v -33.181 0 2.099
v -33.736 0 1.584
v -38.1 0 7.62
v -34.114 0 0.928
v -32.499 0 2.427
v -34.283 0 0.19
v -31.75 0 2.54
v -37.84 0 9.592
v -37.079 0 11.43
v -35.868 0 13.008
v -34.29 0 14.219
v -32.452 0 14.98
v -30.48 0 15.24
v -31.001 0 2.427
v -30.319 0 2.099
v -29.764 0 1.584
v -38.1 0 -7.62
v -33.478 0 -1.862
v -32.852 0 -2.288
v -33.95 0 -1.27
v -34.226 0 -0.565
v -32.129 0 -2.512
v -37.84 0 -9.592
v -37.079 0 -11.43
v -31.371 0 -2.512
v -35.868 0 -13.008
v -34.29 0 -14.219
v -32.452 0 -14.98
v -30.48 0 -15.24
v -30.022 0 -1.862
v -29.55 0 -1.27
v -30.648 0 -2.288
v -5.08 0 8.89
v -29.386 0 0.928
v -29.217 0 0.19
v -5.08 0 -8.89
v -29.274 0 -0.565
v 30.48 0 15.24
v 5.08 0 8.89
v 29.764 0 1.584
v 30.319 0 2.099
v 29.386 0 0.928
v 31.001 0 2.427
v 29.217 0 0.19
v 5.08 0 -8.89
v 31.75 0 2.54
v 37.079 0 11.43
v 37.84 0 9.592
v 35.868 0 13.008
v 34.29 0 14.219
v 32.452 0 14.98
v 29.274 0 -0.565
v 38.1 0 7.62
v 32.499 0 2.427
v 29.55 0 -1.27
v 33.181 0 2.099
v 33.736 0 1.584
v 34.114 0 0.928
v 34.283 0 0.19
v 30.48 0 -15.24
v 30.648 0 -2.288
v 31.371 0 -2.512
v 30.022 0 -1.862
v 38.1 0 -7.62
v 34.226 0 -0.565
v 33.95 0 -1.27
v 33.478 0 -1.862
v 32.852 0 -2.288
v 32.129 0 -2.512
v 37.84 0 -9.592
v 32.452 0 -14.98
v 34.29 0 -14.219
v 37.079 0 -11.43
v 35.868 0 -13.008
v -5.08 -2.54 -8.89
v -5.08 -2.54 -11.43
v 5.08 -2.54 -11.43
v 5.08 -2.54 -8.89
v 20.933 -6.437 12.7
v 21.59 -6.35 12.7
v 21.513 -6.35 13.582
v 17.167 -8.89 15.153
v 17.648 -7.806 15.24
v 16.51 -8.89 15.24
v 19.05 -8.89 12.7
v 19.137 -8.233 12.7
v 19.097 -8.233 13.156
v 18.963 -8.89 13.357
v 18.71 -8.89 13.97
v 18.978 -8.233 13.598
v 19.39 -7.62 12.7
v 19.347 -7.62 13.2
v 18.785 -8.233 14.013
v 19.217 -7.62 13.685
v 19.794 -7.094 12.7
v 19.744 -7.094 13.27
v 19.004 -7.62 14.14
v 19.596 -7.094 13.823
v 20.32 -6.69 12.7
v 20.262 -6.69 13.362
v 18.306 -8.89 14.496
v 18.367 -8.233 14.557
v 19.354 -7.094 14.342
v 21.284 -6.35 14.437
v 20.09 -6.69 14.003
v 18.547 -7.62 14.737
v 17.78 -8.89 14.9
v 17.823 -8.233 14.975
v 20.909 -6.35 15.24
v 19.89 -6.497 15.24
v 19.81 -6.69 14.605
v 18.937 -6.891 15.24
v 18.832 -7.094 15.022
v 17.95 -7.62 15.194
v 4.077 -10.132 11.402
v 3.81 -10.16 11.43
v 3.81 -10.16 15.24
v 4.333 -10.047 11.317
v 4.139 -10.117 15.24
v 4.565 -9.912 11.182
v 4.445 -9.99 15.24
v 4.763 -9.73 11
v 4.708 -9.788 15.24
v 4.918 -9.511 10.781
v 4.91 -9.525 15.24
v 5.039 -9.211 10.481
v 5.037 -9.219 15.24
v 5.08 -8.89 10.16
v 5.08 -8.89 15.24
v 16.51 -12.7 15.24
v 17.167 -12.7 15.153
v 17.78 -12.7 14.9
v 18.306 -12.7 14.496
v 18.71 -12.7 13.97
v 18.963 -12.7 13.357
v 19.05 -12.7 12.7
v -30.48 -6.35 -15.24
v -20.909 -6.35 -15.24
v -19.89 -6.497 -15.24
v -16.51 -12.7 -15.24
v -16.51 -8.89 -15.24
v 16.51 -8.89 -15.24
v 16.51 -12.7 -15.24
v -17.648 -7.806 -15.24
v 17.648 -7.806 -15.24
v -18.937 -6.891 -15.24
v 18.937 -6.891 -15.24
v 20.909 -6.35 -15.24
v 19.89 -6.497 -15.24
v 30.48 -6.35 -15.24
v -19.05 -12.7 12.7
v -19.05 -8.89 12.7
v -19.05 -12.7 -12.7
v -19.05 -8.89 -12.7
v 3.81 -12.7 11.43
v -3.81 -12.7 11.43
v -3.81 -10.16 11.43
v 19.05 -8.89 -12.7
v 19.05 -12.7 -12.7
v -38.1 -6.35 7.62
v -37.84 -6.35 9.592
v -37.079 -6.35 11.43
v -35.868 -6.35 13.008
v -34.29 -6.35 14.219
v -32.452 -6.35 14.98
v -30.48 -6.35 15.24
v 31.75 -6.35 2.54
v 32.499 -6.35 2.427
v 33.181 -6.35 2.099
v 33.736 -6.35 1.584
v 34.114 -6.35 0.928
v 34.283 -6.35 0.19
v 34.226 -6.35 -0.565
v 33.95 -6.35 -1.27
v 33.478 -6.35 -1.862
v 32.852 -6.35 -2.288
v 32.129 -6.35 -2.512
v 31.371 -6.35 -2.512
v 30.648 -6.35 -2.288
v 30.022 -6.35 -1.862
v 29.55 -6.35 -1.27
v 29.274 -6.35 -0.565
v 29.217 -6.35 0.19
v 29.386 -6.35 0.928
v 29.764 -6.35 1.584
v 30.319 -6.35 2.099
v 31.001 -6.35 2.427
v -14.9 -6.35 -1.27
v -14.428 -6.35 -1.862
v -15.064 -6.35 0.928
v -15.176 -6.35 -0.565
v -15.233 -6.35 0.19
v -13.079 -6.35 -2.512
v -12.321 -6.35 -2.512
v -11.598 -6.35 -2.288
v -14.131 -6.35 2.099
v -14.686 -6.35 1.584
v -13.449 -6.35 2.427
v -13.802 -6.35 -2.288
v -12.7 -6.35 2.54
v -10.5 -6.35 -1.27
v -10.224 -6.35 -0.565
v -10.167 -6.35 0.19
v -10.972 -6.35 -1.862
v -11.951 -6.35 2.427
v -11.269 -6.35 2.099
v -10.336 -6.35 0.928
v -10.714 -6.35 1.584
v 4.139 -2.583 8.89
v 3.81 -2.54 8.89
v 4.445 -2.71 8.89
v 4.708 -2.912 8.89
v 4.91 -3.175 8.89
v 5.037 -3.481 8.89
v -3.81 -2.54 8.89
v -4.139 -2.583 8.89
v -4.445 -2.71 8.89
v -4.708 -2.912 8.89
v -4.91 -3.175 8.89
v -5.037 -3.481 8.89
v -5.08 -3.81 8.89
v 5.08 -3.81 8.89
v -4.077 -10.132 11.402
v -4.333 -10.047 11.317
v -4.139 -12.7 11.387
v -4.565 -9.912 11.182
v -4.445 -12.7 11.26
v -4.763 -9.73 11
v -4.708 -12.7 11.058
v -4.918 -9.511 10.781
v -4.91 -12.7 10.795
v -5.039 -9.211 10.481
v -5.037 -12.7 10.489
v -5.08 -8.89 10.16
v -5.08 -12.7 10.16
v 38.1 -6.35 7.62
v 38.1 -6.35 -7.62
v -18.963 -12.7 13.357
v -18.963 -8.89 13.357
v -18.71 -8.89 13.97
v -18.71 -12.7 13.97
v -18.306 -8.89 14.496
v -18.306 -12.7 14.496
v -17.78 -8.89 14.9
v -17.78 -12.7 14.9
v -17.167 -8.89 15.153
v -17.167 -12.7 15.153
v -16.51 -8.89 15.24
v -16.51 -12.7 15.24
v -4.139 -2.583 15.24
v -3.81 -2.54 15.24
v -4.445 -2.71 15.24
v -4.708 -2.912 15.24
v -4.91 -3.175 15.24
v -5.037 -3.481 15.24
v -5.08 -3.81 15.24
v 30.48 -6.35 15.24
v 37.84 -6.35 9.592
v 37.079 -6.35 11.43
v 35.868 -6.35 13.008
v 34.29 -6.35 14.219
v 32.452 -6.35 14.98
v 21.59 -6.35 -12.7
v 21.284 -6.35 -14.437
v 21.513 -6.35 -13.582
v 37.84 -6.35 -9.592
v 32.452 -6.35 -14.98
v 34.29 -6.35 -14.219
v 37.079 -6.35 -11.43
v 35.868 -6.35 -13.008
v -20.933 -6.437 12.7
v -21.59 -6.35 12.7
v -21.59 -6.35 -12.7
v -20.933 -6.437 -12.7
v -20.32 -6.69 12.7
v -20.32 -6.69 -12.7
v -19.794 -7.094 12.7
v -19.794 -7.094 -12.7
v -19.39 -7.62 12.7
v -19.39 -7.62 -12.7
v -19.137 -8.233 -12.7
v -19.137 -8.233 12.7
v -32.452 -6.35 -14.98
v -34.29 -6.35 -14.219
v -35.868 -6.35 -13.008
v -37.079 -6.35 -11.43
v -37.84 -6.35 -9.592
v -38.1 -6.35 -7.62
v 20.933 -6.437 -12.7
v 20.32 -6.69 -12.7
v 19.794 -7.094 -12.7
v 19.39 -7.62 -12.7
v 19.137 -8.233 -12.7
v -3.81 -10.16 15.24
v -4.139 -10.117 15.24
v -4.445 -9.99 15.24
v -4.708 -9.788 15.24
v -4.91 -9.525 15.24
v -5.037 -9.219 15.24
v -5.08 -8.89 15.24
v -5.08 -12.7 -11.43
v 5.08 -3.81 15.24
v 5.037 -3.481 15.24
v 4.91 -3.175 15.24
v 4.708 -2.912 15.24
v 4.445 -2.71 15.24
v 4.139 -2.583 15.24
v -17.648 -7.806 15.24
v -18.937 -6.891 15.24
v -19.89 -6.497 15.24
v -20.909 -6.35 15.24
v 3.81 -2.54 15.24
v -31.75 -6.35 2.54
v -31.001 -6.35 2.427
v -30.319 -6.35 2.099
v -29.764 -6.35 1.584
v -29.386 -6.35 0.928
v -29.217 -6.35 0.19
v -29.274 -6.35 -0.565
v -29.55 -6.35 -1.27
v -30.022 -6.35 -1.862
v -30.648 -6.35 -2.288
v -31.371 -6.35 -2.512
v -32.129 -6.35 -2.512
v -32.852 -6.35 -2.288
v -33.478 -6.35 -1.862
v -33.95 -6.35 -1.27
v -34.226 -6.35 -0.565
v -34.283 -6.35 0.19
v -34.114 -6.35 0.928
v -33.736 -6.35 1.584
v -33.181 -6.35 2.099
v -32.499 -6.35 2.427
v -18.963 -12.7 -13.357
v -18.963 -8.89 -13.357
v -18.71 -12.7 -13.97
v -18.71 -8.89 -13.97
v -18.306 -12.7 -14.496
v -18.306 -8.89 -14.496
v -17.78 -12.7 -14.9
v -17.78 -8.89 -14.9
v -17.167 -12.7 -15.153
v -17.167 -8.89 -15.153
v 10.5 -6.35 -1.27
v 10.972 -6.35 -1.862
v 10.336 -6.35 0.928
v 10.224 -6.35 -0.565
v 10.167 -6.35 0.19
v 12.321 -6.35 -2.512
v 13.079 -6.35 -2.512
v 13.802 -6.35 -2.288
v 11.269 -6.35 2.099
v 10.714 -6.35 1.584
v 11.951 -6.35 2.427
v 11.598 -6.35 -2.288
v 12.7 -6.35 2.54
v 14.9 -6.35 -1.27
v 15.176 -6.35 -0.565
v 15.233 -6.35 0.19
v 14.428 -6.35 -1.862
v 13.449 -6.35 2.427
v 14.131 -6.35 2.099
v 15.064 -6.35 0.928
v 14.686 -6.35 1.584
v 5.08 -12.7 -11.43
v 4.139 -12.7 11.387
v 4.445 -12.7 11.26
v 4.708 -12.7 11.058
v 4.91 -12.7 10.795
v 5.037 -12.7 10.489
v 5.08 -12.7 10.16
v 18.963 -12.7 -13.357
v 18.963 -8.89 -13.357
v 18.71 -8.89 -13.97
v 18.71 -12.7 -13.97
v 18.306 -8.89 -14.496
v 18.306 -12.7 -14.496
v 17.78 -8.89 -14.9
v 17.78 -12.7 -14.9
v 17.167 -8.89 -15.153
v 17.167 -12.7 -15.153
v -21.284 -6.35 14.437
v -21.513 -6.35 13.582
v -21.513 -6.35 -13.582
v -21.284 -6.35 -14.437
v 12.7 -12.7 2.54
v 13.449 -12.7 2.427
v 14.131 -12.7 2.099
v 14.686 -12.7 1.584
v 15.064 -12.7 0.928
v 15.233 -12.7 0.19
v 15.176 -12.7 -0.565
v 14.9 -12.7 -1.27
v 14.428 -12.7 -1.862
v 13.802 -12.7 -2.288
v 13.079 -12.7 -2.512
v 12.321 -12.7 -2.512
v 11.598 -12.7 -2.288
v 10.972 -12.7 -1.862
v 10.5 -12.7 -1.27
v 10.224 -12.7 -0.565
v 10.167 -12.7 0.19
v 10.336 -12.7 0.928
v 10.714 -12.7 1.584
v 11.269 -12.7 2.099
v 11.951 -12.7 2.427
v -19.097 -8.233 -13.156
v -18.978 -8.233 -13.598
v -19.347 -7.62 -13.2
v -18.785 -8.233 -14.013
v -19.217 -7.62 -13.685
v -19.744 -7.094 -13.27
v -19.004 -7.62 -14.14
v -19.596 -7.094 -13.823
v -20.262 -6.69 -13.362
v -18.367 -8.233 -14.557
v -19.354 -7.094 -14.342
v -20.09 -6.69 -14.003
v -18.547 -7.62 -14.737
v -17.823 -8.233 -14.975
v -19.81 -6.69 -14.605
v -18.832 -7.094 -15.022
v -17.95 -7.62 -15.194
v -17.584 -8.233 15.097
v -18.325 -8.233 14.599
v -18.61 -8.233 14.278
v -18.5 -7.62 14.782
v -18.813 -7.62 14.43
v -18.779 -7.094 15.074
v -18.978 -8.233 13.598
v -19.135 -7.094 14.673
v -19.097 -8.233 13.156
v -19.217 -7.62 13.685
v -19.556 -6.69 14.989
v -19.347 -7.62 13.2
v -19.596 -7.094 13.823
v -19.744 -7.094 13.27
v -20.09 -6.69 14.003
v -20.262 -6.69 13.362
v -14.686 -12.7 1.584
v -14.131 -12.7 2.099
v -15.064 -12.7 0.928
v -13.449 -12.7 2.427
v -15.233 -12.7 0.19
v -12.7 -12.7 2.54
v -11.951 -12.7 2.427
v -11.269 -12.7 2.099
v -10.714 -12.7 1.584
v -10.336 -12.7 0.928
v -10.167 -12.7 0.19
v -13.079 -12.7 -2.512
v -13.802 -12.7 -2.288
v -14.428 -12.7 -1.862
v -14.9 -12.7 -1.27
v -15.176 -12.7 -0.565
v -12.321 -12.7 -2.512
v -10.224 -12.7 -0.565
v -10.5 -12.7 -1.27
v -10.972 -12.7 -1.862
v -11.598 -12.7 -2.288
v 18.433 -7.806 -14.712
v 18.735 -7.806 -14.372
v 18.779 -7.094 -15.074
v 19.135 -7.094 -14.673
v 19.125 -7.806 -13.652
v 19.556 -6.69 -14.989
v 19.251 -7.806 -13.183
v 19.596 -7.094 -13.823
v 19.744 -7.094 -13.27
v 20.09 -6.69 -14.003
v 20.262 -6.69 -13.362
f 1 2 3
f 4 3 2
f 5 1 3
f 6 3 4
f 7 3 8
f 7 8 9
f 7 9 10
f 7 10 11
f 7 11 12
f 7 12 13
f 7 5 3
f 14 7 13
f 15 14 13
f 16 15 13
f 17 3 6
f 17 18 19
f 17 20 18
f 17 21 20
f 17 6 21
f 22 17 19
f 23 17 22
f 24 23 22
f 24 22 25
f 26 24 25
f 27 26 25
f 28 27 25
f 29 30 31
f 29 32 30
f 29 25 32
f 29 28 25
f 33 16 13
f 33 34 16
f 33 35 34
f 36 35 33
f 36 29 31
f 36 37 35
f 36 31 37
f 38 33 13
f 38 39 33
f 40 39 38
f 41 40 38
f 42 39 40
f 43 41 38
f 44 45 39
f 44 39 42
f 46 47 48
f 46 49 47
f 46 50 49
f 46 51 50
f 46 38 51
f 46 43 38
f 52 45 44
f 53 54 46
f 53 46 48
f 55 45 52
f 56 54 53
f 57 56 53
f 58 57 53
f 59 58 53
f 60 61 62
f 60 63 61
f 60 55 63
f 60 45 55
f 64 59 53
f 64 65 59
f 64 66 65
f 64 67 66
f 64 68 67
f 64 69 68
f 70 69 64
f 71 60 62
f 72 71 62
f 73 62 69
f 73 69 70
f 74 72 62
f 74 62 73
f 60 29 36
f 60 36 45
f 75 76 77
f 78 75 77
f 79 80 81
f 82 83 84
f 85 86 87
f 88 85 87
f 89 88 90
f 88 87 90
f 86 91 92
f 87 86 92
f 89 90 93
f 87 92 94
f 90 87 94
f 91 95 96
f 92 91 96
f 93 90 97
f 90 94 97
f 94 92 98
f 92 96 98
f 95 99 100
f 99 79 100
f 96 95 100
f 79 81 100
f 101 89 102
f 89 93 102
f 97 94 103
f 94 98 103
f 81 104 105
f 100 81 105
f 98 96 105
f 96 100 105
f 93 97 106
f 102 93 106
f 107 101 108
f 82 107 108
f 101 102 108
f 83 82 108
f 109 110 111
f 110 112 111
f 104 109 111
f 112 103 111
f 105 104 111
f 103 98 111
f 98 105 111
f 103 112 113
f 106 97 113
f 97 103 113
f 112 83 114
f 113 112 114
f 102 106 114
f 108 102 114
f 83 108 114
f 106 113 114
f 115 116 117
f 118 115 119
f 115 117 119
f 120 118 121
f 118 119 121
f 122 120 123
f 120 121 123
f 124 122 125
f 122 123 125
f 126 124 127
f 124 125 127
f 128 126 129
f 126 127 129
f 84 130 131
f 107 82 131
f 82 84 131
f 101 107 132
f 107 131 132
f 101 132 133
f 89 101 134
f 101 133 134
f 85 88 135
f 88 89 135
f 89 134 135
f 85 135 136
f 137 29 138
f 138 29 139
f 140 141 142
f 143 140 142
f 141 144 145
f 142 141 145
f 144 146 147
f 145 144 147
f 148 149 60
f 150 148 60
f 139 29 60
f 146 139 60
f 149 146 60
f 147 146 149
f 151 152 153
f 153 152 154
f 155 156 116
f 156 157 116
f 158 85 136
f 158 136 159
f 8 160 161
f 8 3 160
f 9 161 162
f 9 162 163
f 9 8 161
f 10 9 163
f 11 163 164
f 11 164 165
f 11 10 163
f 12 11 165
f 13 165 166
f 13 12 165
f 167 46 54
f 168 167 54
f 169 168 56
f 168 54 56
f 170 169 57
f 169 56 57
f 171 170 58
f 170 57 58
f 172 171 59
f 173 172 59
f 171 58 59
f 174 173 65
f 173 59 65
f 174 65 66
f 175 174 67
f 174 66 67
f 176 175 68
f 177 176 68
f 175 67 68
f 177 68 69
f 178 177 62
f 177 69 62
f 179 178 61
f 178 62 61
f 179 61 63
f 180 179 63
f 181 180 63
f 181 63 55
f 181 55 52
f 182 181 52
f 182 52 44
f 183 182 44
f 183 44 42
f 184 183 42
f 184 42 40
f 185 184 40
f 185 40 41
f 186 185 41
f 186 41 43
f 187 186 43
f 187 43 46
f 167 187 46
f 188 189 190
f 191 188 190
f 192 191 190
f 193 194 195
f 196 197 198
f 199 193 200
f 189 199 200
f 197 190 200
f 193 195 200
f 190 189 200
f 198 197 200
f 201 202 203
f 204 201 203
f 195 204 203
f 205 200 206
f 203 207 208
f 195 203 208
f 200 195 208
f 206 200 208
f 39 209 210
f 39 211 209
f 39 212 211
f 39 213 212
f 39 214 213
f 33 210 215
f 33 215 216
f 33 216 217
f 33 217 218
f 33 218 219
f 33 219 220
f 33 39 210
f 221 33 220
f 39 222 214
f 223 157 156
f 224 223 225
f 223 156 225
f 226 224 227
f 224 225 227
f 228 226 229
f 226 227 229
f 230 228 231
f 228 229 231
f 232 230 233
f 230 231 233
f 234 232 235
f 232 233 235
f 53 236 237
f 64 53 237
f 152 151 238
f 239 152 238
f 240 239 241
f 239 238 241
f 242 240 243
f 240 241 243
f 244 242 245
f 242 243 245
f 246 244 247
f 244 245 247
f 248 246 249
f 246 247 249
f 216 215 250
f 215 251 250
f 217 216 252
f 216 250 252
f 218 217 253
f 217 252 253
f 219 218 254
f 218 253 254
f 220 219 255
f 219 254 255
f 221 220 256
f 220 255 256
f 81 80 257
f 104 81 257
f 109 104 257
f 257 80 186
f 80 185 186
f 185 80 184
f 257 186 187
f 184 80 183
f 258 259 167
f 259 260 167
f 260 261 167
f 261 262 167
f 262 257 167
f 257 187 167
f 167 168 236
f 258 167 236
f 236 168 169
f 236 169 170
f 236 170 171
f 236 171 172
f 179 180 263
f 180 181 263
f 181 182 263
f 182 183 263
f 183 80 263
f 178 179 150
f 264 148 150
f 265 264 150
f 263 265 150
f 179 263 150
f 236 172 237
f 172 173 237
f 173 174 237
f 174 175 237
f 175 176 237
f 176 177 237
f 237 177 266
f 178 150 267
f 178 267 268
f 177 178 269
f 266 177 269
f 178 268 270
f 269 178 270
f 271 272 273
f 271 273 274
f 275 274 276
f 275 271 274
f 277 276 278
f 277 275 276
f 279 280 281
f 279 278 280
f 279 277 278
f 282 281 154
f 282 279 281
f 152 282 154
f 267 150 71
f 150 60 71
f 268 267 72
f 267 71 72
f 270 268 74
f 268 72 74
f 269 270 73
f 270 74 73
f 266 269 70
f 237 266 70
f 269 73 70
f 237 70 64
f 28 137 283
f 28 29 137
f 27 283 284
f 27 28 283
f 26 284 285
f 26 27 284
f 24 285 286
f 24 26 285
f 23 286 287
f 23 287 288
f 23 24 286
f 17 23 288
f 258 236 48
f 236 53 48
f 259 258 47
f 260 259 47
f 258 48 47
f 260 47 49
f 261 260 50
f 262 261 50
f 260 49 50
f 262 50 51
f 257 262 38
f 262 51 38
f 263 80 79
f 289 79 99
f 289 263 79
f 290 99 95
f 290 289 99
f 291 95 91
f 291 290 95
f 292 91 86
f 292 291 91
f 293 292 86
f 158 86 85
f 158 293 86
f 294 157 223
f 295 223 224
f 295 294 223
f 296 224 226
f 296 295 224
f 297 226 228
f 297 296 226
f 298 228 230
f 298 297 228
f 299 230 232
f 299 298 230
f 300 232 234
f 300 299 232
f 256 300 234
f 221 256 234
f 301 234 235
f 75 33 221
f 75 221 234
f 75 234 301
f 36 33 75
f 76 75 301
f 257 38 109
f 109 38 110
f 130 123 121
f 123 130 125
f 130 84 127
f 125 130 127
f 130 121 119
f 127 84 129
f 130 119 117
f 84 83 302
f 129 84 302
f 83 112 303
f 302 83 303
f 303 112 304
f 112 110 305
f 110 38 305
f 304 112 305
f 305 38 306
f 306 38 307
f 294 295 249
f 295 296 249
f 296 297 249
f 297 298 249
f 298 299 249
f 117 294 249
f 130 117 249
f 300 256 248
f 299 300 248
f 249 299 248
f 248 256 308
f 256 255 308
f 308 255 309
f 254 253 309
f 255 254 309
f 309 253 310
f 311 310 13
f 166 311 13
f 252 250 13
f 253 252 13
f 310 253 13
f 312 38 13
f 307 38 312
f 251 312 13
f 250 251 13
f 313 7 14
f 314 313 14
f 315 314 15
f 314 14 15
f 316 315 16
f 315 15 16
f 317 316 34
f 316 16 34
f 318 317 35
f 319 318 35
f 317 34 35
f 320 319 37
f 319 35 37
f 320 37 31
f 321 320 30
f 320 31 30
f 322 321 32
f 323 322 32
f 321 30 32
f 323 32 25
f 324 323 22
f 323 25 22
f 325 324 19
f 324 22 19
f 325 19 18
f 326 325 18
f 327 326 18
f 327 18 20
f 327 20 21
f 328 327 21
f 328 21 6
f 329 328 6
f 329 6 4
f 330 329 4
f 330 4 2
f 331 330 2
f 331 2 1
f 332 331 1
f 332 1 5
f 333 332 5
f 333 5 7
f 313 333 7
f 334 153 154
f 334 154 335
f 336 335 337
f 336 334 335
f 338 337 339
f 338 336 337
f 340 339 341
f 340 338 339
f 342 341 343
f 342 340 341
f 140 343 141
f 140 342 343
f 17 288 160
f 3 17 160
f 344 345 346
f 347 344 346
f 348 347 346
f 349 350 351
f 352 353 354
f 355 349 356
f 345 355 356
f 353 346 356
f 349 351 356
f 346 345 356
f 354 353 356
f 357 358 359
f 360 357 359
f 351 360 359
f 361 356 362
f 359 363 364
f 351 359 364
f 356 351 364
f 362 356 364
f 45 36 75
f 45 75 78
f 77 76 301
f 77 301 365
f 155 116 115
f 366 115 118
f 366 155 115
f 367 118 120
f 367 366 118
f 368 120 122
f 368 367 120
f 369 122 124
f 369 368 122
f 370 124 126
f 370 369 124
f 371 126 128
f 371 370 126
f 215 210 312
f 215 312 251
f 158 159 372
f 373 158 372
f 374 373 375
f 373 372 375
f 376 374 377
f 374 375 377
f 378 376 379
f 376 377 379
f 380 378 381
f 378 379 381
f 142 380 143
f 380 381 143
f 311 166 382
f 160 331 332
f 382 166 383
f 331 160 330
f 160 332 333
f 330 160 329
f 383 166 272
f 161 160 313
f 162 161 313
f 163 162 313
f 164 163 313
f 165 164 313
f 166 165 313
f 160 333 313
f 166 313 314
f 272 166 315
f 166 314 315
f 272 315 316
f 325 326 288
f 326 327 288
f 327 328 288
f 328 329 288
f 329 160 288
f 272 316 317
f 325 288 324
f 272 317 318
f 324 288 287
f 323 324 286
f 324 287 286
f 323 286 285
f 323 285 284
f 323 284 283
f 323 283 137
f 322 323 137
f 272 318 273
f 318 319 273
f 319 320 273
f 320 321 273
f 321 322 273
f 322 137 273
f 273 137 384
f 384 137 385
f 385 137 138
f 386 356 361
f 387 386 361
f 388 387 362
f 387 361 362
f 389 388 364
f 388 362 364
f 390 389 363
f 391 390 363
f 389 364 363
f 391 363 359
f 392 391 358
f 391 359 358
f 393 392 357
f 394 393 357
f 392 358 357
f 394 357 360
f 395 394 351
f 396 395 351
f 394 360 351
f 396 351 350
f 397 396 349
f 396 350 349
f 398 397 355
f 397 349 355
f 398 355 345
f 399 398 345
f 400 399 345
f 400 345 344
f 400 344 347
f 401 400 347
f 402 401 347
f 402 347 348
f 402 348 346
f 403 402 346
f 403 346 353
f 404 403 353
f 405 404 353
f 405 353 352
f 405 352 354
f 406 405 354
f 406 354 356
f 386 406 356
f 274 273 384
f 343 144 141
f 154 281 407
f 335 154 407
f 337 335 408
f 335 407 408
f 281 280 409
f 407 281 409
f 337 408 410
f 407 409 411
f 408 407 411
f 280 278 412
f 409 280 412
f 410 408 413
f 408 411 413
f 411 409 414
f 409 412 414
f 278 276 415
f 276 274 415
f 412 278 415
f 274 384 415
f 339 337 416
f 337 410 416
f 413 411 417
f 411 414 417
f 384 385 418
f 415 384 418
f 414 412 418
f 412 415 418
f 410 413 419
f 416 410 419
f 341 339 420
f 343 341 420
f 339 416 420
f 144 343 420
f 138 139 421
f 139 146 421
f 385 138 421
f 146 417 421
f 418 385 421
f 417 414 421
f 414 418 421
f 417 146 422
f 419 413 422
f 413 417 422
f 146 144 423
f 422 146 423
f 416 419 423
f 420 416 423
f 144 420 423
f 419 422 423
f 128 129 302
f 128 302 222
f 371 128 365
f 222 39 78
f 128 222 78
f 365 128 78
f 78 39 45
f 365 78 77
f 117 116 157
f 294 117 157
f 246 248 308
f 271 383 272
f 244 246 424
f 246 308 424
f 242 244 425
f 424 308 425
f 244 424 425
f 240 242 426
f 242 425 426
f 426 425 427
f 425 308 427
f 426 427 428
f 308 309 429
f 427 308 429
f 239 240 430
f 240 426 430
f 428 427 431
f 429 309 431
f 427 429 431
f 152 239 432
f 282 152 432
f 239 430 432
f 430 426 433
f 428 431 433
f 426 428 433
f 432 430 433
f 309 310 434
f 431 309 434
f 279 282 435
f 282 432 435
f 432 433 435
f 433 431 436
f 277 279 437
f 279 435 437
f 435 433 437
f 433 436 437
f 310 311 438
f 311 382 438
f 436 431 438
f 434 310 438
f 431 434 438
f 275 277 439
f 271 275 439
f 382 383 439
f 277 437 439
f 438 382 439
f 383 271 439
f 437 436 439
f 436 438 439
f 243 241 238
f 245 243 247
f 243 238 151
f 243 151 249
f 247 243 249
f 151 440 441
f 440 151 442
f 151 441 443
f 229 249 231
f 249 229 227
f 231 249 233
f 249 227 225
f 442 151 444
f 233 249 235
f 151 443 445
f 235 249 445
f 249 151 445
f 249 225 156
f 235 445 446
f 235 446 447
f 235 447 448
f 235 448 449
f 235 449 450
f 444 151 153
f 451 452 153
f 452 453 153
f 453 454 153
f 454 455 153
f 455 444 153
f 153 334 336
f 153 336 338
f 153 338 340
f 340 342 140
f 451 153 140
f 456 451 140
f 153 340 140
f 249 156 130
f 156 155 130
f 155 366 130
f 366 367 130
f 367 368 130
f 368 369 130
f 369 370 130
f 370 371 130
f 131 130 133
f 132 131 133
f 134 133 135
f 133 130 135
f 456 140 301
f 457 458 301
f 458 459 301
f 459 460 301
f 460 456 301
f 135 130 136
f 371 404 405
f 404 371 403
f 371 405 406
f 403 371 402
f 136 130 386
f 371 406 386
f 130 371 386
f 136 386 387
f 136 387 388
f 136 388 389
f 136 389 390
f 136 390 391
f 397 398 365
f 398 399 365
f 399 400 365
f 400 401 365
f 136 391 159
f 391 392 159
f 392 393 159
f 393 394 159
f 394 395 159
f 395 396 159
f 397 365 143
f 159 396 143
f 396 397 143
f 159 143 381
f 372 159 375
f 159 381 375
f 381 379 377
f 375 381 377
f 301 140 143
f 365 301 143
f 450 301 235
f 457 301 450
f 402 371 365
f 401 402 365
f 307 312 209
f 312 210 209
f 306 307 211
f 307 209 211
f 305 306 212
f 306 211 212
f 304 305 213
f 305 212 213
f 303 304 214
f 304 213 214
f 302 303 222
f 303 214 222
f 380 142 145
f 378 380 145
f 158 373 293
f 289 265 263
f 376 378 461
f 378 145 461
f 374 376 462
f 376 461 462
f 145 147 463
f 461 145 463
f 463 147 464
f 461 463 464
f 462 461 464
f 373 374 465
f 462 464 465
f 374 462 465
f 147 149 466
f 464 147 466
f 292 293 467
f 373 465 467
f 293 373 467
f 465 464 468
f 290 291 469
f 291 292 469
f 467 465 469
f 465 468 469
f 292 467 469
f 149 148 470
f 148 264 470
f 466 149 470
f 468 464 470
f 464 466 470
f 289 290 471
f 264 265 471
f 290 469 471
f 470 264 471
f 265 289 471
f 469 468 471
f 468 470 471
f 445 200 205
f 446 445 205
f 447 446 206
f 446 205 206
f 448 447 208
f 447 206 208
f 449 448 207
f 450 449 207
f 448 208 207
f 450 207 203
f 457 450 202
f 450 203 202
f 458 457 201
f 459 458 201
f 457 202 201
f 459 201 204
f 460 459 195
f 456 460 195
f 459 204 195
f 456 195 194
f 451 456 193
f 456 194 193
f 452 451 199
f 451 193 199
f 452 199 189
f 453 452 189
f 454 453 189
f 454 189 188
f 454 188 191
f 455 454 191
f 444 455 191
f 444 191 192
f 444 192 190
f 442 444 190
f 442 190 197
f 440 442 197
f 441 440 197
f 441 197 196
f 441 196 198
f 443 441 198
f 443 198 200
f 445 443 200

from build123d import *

# Parameters (mm, degrees)
SKETCH1_W           = 38.1
SKETCH1_H           = 30.48
SKETCH1_R           = 2.54
SKETCH1_W_2         = 10.16
SKETCH1_H_2         = 22.86
BOSS_EXTRUDE1_DEPTH = 12.7
SKETCH2_W           = 10.16
SKETCH2_H           = 2.54
BOSS_EXTRUDE2_DEPTH = 2.54
SKETCH3_W           = 10.16
SKETCH3_H           = 2.54
BOSS_EXTRUDE3_DEPTH = 2.54
FILLET1_R           = 2.54
SKETCH4_W           = 10.16
SKETCH4_H           = 7.62
CUT_EXTRUDE1_DEPTH  = 36.149415358
FILLET2_R           = 1.27
BOSS_EXTRUDE4_START = -6.35
SKETCH5_R           = 2.54
BOSS_EXTRUDE4_DEPTH = 6.35
SKETCH6_R           = 2.54
CUT_EXTRUDE2_DEPTH  = 43.955297694
FILLET3_R           = 7.62
FILLET4_R           = 2.54


with BuildPart() as part:
    # Sketch1 → Boss-Extrude1 (new body)
    with BuildSketch(Plane(origin=(0, 0, 0), x_dir=(1, 0, 0), z_dir=(0, 1, 0))):
        Rectangle(SKETCH1_W, SKETCH1_H)
        with Locations(Location((12.7, 0, 0), (0, 0, 270))):
            Circle(SKETCH1_R, mode=Mode.SUBTRACT)
        with Locations(Location((-12.7, 0, 0), (0, 0, 270))):
            Circle(SKETCH1_R, mode=Mode.SUBTRACT)
        Rectangle(SKETCH1_W_2, SKETCH1_H_2, mode=Mode.SUBTRACT)
    extrude(amount=-BOSS_EXTRUDE1_DEPTH)

    # Sketch2 → Boss-Extrude2 (add)
    with BuildSketch(Plane.XY.offset(-11.43)):
        with Locations((0, -1.27)):
            Rectangle(SKETCH2_W, SKETCH2_H)
    extrude(amount=BOSS_EXTRUDE2_DEPTH)

    # Sketch3 → Boss-Extrude3 (add)
    with BuildSketch(Plane(origin=(0, 0, 11.43), x_dir=(-1, 0, 0), z_dir=(0, 0, -1))):
        with Locations((0, -1.27)):
            Rectangle(SKETCH3_W, SKETCH3_H)
    extrude(amount=BOSS_EXTRUDE3_DEPTH)

    # Fillet1
    fillet1_edges = [part.edges().sort_by_distance(p)[0] for p in [
        (19.05, -6.35, 15.24),
        (-19.05, -6.35, 15.24),
        (-19.05, -6.35, -15.24),
        (19.05, -6.35, -15.24),
    ]]
    fillet(fillet1_edges, radius=FILLET1_R)

    # Sketch4 → Cut-Extrude1 (cut, through all)
    with BuildSketch(Plane(origin=(0, 0, 11.43), x_dir=(-1, 0, 0), z_dir=(0, 0, -1))):
        with Locations((0, -6.35)):
            Rectangle(SKETCH4_W, SKETCH4_H)
    extrude(amount=-CUT_EXTRUDE1_DEPTH, mode=Mode.SUBTRACT)

    # Fillet2
    fillet2_edges = [part.edges().sort_by_distance(p)[0] for p in [
        (-5.08, -11.43, 11.43),
        (5.08, -11.43, 11.43),
        (-5.08, -2.54, 12.065),
        (5.08, -2.54, 12.065),
        (5.08, -10.16, 13.335),
        (-5.08, -10.16, 13.335),
    ]]
    fillet(fillet2_edges, radius=FILLET2_R)

    # Sketch5 → Boss-Extrude4 (add)
    with BuildSketch(Plane(origin=(0, 0, 0), x_dir=(1, 0, 0), z_dir=(0, 1, 0)).offset(BOSS_EXTRUDE4_START)):
        with BuildLine():
            Line((-16.51, 15.24), (-38.1, 15.24))
            Line((-38.1, 15.24), (-38.1, -15.24))
            Line((-38.1, -15.24), (-16.51, -15.24))
            ThreePointArc((-16.51, -15.24), (-18.306051224, -14.496051224), (-19.05, -12.7))
            Line((-19.05, -12.7), (-19.05, 12.7))
            ThreePointArc((-19.05, 12.7), (-18.306051224, 14.496051224), (-16.51, 15.24))
        make_face()
        with BuildLine():
            Line((38.1, 15.24), (16.51, 15.24))
            ThreePointArc((16.51, 15.24), (18.306051224, 14.496051224), (19.05, 12.7))
            Line((19.05, 12.7), (19.05, -12.7))
            ThreePointArc((19.05, -12.7), (18.306051224, -14.496051224), (16.51, -15.24))
            Line((16.51, -15.24), (38.1, -15.24))
            Line((38.1, -15.24), (38.1, 15.24))
        make_face()
        with Locations(Location((12.7, 0, 0), (0, 0, 270))):
            Circle(SKETCH5_R)
        with Locations(Location((-12.7, 0, 0), (0, 0, 270))):
            Circle(SKETCH5_R)
    extrude(amount=BOSS_EXTRUDE4_DEPTH)

    # Sketch6 → Cut-Extrude2 (cut, through all)
    with BuildSketch(Plane(origin=(0, 0, 0), x_dir=(1, 0, 0), z_dir=(0, 1, 0))):
        with Locations(Location((-31.75, 0, 0), (0, 0, 270))):
            Circle(SKETCH6_R)
        with Locations(Location((31.75, 0, 0), (0, 0, 270))):
            Circle(SKETCH6_R)
    extrude(amount=-CUT_EXTRUDE2_DEPTH, mode=Mode.SUBTRACT)

    # Fillet3
    fillet3_edges = [part.edges().sort_by_distance(p)[0] for p in [
        (38.1, -3.175, 15.24),
        (-38.1, -3.175, 15.24),
        (-38.1, -3.175, -15.24),
        (38.1, -3.175, -15.24),
    ]]
    fillet(fillet3_edges, radius=FILLET3_R)

    # Fillet4
    # the kernel refuses this fillet: 2.54 mm, written as the material it adds along each edge
    with BuildSketch(Plane(origin=(-16.51, -6.35, -12.7), x_dir=(-1, 0, 0), z_dir=(0, 0, 1))) as fillet4_piece_1_section:
        with BuildLine():
            CenterArc((2.54 + FILLET4_R, FILLET4_R), FILLET4_R, 180, 90)
            Line((2.54, FILLET4_R), (2.54, 0))
            Line((2.54, 0), (2.54 + FILLET4_R, 0))
        make_face()
    fillet4_piece_1 = revolve(axis=Axis((-16.51, -6.35, -12.7), (0, -1, 0)), revolution_arc=233.296989237, mode=Mode.PRIVATE)
    fillet4_piece_1 = split(fillet4_piece_1, bisect_by=Plane(origin=(-19.608229137, -6.77494251, -15.24), z_dir=(0, 0, 1)), keep=Keep.TOP, mode=Mode.PRIVATE)
    add(fillet4_piece_1)
    with BuildSketch(Plane(origin=(16.51, -6.35, 12.7), x_dir=(1, 0, 0), z_dir=(0, 0, -1))) as fillet4_piece_2_section:
        with BuildLine():
            CenterArc((2.54 + FILLET4_R, FILLET4_R), FILLET4_R, 180, 90)
            Line((2.54, FILLET4_R), (2.54, 0))
            Line((2.54, 0), (2.54 + FILLET4_R, 0))
        make_face()
    fillet4_piece_2 = revolve(axis=Axis((16.51, -6.35, 12.7), (0, -1, 0)), revolution_arc=233.296989237, mode=Mode.PRIVATE)
    fillet4_piece_2 = split(fillet4_piece_2, bisect_by=Plane(origin=(19.608229137, -6.77494251, 15.24), z_dir=(0, 0, -1)), keep=Keep.TOP, mode=Mode.PRIVATE)
    add(fillet4_piece_2)
    with BuildSketch(Plane(origin=(-16.51, -6.35, 12.7), x_dir=(0.5976672776328222, 0, -0.8017442392976523), z_dir=(-0.8017442392976523, 0, -0.5976672776328222))) as fillet4_piece_3_section:
        with BuildLine():
            CenterArc((2.54 + FILLET4_R, FILLET4_R), FILLET4_R, 180, 90)
            Line((2.54, FILLET4_R), (2.54, 0))
            Line((2.54, 0), (2.54 + FILLET4_R, 0))
        make_face()
    fillet4_piece_3 = revolve(axis=Axis((-16.51, -6.35, 12.7), (0, -1, 0)), revolution_arc=233.296989237, mode=Mode.PRIVATE)
    fillet4_piece_3 = split(fillet4_piece_3, bisect_by=Plane(origin=(-18.414845025, -7.141535935, 15.24), z_dir=(0, 0, -1)), keep=Keep.TOP, mode=Mode.PRIVATE)
    add(fillet4_piece_3)
    with BuildSketch(Plane(origin=(-19.05, -6.35, 12.7), x_dir=(-1, 0, 0), z_dir=(0, 0, -1)), Plane(origin=(19.05, -6.35, -12.7), x_dir=(1, 0, 0), z_dir=(0, 0, 1))) as fillet4_piece_4:
        with BuildLine():
            CenterArc((FILLET4_R, -FILLET4_R), FILLET4_R, 90, 90)
            Line((0, -FILLET4_R), (0, 0))
            Line((0, 0), (FILLET4_R, 0))
        make_face()
    extrude(amount=25.4)
    with BuildSketch(Plane(origin=(16.51, -6.35, -12.7), x_dir=(-0.5976672776328322, 0, 0.8017442392976448), z_dir=(0.8017442392976448, 0, 0.5976672776328322))) as fillet4_piece_5_section:
        with BuildLine():
            CenterArc((2.54 + FILLET4_R, FILLET4_R), FILLET4_R, 180, 90)
            Line((2.54, FILLET4_R), (2.54, 0))
            Line((2.54, 0), (2.54 + FILLET4_R, 0))
        make_face()
    fillet4_piece_5 = revolve(axis=Axis((16.51, -6.35, -12.7), (0, -1, 0)), revolution_arc=233.296989237, mode=Mode.PRIVATE)
    fillet4_piece_5 = split(fillet4_piece_5, bisect_by=Plane(origin=(18.414845035, -7.141535946, -15.24), z_dir=(0, 0, 1)), keep=Keep.TOP, mode=Mode.PRIVATE)
    add(fillet4_piece_5)


solid = part.part
